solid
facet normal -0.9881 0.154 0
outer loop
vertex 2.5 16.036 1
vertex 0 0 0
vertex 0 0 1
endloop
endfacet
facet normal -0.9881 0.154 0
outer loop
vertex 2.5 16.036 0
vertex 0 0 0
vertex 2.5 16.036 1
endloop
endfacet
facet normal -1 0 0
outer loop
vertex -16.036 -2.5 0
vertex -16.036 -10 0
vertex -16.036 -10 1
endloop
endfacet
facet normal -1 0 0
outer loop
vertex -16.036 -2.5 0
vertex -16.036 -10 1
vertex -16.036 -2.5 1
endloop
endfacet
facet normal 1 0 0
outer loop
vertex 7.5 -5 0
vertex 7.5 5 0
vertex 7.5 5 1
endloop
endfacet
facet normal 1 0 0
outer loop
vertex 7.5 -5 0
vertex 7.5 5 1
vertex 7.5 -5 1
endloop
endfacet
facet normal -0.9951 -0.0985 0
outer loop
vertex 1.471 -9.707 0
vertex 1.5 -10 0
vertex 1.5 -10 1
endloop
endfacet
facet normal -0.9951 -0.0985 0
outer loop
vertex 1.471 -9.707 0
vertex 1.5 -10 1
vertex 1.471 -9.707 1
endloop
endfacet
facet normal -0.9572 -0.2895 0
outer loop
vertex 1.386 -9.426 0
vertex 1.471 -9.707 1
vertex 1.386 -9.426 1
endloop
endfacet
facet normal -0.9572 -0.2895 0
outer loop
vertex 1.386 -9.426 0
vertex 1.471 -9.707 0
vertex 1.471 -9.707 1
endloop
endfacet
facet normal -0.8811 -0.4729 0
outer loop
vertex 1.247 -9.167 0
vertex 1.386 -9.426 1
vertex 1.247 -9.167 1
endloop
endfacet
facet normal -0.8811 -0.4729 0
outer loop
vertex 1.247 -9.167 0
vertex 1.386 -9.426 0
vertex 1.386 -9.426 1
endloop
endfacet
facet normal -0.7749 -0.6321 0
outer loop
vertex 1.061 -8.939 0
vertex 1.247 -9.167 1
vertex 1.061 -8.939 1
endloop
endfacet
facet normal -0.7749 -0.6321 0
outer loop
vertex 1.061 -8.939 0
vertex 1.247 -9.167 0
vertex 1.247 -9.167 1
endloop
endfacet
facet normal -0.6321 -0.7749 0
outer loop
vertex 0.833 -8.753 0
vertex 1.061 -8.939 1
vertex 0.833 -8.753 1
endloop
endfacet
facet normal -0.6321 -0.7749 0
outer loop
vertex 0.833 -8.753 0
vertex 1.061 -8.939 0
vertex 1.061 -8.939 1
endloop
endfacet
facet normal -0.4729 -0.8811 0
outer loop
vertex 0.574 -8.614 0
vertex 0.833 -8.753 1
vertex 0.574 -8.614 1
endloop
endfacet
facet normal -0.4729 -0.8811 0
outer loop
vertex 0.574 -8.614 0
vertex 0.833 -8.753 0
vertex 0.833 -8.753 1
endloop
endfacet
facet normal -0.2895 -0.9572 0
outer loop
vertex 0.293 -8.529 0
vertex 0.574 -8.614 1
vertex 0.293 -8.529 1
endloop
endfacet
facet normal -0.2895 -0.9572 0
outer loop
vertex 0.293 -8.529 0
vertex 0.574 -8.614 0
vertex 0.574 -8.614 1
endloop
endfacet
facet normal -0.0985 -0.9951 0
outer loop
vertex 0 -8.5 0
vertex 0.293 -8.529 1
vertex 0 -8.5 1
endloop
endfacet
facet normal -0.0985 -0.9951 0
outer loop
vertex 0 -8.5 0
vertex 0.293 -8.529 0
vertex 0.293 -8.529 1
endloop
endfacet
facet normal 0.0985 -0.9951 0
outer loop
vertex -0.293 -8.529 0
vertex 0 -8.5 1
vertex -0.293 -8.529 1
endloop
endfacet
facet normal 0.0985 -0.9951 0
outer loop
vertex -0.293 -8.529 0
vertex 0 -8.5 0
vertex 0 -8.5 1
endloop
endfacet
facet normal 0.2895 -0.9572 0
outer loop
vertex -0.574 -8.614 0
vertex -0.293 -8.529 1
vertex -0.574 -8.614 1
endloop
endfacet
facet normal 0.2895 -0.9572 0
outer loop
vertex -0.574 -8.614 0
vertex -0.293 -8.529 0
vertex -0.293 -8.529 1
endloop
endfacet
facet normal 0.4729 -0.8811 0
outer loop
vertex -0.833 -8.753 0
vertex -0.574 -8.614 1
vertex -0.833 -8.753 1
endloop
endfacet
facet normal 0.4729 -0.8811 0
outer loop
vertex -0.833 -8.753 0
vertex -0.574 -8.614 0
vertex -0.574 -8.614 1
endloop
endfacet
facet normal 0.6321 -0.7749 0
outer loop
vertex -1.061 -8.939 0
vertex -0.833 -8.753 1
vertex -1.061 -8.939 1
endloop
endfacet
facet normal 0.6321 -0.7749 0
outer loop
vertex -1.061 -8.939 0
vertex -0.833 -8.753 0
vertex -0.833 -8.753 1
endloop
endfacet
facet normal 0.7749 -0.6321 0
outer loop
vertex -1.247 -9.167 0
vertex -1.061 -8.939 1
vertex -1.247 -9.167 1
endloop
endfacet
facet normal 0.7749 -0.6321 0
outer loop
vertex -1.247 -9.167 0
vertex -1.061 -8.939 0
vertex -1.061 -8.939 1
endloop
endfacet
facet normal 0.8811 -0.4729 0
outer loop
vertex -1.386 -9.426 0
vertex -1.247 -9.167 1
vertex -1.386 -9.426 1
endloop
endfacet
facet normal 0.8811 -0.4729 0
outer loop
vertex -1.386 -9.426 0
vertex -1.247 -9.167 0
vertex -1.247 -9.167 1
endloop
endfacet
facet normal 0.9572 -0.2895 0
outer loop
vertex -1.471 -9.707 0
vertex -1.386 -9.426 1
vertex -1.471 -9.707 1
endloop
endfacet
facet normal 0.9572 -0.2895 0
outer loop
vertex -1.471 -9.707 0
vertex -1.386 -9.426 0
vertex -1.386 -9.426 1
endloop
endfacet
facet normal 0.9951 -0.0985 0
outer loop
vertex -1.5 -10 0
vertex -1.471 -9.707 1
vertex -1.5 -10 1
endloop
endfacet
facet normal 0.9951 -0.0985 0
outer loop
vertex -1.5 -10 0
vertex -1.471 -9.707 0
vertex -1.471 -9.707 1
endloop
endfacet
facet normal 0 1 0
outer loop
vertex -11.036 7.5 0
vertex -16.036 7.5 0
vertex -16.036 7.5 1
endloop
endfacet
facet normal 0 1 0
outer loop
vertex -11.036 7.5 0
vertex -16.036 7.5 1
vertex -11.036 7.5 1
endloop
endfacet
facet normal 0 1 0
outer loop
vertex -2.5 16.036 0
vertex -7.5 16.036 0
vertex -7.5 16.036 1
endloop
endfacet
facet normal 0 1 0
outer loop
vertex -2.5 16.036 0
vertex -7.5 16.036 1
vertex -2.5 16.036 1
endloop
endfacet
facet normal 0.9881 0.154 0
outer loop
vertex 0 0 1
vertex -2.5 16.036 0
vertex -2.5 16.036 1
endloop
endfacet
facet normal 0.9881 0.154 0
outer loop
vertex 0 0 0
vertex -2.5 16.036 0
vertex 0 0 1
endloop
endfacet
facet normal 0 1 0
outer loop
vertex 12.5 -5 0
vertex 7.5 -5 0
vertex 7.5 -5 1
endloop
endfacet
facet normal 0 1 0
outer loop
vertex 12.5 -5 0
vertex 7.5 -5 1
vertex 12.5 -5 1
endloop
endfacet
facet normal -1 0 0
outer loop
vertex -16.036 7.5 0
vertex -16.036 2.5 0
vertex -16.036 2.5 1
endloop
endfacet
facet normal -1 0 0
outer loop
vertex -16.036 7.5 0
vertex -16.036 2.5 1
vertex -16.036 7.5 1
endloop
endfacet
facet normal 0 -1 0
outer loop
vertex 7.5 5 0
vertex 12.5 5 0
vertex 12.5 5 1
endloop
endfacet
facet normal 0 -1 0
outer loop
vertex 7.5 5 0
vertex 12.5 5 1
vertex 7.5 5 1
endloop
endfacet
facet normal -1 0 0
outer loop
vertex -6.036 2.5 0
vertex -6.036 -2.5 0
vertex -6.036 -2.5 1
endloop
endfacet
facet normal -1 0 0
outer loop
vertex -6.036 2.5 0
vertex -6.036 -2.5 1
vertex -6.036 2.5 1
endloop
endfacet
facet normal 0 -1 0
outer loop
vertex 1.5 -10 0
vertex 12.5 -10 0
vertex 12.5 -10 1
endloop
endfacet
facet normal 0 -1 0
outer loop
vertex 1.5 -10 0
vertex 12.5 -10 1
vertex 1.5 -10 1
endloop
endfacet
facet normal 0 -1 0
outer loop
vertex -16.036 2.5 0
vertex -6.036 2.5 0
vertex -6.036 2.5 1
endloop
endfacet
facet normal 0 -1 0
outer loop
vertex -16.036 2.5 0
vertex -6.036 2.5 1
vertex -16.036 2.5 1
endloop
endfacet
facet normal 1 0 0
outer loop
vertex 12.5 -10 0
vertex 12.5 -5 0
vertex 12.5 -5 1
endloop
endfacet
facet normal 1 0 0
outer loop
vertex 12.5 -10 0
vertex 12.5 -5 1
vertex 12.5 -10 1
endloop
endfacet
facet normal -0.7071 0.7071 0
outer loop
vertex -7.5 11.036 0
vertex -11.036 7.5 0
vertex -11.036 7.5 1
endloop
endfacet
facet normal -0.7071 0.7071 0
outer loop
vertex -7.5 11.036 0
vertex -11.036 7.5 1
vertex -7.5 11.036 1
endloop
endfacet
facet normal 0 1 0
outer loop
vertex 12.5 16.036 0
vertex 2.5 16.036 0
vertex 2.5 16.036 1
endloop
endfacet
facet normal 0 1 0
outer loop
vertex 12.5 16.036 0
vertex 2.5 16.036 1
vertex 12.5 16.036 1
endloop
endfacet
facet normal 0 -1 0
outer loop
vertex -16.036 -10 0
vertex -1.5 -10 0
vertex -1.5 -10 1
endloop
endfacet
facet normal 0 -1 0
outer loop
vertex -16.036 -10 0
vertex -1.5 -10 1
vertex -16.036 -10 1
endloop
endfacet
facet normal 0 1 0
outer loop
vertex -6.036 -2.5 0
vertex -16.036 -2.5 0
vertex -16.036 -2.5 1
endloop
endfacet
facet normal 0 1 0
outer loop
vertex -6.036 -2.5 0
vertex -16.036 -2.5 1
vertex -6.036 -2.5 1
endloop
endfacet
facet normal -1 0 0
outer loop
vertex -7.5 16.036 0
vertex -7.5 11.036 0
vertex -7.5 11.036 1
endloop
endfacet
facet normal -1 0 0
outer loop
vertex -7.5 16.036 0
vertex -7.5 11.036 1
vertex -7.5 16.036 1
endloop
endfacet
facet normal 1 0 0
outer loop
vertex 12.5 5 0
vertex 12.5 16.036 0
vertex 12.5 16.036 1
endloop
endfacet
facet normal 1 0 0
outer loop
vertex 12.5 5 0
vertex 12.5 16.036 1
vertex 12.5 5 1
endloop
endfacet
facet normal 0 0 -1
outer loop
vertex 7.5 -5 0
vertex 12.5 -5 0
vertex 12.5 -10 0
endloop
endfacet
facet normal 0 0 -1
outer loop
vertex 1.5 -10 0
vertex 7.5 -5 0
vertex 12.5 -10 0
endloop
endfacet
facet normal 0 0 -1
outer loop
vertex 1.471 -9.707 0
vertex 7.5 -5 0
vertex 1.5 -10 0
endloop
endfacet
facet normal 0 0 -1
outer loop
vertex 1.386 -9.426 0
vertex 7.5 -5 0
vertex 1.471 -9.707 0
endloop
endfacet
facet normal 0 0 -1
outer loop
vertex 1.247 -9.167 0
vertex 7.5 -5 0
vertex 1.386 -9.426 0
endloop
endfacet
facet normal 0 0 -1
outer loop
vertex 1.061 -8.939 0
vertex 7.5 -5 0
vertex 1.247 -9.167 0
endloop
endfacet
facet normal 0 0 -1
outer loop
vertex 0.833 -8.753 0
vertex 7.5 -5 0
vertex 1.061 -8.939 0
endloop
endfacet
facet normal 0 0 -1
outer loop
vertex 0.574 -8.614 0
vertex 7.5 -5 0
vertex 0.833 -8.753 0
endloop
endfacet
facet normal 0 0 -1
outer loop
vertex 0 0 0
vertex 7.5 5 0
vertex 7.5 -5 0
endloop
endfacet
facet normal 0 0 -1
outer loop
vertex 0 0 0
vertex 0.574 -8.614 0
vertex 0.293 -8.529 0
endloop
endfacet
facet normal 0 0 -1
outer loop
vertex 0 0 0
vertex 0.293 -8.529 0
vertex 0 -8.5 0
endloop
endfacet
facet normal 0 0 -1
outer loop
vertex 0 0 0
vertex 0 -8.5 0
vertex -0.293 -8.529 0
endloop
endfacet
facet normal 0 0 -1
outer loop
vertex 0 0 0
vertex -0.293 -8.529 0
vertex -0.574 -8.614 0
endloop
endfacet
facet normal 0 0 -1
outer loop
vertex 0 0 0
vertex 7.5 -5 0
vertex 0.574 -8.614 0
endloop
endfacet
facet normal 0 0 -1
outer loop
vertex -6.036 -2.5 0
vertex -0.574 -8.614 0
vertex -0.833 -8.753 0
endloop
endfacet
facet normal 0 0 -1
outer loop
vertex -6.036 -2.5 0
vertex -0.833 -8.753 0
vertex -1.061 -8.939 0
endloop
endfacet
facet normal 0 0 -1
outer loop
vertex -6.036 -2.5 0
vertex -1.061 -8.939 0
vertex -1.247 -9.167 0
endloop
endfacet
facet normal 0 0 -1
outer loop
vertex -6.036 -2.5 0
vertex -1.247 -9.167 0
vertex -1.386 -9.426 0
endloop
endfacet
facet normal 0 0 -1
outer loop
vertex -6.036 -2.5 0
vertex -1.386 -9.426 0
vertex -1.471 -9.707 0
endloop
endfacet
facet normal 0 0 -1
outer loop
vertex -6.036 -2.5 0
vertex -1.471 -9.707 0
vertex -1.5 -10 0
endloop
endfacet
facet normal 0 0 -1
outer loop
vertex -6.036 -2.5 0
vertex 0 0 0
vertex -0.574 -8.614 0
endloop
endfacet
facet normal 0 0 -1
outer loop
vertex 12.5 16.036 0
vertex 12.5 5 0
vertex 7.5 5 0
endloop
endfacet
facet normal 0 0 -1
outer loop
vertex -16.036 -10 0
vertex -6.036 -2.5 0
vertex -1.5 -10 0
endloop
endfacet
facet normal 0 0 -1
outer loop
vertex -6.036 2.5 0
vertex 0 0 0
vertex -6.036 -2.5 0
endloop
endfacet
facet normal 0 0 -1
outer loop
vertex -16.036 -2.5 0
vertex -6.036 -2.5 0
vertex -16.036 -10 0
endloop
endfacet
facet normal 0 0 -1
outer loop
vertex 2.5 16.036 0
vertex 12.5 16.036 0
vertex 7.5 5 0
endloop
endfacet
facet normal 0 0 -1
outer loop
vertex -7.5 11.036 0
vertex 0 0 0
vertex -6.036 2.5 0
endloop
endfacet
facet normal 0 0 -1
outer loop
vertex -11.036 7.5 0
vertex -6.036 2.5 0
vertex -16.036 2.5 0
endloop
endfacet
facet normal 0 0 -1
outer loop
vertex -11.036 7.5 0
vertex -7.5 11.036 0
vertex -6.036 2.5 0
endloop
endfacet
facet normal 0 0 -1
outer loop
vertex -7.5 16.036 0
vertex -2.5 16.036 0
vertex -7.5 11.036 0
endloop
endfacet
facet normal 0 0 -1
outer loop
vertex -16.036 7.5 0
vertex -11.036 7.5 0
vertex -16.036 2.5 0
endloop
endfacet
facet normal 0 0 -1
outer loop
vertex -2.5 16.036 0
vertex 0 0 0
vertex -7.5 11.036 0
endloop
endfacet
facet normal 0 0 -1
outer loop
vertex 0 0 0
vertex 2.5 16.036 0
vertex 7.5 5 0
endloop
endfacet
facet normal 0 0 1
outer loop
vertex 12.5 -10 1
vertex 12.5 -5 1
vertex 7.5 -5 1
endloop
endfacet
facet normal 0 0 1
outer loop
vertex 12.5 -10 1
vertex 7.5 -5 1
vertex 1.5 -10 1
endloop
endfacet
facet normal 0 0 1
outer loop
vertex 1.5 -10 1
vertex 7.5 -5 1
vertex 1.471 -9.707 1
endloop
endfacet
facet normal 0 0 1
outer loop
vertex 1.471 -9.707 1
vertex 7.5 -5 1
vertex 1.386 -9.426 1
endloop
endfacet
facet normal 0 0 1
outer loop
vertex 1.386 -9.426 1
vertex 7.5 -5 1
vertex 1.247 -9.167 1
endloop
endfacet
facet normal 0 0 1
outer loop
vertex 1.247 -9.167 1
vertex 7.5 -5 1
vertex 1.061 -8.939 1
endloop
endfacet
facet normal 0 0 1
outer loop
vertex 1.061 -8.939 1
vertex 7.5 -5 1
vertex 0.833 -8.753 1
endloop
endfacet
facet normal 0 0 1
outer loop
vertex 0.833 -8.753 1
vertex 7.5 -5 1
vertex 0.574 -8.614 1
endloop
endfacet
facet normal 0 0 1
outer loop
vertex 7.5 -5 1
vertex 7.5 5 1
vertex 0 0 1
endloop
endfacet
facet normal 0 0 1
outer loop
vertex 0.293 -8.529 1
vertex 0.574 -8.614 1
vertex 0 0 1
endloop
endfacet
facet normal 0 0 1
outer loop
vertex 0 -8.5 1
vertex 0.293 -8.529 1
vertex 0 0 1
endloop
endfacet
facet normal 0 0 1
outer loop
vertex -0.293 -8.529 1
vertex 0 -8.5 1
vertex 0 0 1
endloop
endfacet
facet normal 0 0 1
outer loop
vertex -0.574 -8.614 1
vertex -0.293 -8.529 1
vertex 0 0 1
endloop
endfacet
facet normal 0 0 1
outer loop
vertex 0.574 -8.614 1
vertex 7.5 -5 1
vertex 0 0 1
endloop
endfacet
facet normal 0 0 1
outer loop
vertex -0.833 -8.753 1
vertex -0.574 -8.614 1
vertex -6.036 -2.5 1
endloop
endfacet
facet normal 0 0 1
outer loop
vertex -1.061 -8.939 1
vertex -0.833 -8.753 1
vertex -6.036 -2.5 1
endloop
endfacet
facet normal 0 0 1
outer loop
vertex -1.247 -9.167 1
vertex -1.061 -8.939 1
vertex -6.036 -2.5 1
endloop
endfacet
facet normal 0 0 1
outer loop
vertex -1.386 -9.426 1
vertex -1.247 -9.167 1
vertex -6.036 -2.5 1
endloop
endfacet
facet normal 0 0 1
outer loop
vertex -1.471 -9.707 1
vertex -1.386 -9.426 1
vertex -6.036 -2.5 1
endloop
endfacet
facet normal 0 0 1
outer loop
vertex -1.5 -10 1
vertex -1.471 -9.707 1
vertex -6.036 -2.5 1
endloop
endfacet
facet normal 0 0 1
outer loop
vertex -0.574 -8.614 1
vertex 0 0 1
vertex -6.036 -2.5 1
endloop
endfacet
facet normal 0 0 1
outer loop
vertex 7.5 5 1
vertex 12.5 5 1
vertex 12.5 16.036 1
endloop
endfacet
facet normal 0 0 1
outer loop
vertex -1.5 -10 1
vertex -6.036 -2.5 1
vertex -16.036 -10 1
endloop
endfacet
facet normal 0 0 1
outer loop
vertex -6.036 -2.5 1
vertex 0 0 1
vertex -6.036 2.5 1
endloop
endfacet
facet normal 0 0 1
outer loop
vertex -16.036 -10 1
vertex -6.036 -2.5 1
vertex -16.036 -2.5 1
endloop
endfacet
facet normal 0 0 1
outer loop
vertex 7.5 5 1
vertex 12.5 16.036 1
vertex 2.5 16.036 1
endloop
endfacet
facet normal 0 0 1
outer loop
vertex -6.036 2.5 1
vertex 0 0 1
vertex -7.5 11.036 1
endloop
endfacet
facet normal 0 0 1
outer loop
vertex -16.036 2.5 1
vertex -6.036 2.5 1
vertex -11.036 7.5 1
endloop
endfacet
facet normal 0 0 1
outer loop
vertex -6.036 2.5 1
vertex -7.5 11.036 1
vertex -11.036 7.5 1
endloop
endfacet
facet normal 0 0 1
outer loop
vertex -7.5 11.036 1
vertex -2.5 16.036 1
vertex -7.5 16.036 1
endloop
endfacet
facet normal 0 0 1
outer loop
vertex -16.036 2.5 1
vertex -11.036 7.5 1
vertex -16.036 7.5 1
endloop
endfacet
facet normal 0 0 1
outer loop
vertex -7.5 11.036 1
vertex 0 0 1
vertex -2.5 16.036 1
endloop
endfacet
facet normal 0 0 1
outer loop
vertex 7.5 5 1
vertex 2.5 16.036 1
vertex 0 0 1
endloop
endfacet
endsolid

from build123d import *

# Parameters (mm, degrees)
PAD_DEPTH = 1


with BuildPart() as part:
    # Sketch → Pad (new body)
    with BuildSketch(Plane.XY):
        with BuildLine():
            Line((-16.035534, -10), (-16.035534, -2.5))
            Line((-16.035534, -2.5), (-6.035534, -2.5))
            Line((-6.035534, -2.5), (-6.035534, 2.5))
            Line((-6.035534, 2.5), (-16.035534, 2.5))
            Line((-16.035534, 2.5), (-16.035534, 7.5))
            Line((-16.035534, 7.5), (-11.035534, 7.5))
            Line((-11.035534, 7.5), (-7.5, 11.035534))
            Line((-7.5, 11.035534), (-7.5, 16.035534))
            Line((-7.5, 16.035534), (-2.5, 16.035534))
            Line((-2.5, 16.035534), (0, 0))
            Line((0, 0), (2.5, 16.035534))
            Line((2.5, 16.035534), (12.5, 16.035534))
            Line((12.5, 16.035534), (12.5, 5))
            Line((12.5, 5), (7.5, 5))
            Line((7.5, 5), (7.5, -5))
            Line((7.5, -5), (12.5, -5))
            Line((12.5, -5), (12.5, -10))
            Line((12.5, -10), (1.5, -10))
            ThreePointArc((1.5, -10), (0, -8.5), (-1.5, -10))
            Line((-1.5, -10), (-16.035534, -10))
        make_face()
    extrude(amount=PAD_DEPTH)


solid = part.part
